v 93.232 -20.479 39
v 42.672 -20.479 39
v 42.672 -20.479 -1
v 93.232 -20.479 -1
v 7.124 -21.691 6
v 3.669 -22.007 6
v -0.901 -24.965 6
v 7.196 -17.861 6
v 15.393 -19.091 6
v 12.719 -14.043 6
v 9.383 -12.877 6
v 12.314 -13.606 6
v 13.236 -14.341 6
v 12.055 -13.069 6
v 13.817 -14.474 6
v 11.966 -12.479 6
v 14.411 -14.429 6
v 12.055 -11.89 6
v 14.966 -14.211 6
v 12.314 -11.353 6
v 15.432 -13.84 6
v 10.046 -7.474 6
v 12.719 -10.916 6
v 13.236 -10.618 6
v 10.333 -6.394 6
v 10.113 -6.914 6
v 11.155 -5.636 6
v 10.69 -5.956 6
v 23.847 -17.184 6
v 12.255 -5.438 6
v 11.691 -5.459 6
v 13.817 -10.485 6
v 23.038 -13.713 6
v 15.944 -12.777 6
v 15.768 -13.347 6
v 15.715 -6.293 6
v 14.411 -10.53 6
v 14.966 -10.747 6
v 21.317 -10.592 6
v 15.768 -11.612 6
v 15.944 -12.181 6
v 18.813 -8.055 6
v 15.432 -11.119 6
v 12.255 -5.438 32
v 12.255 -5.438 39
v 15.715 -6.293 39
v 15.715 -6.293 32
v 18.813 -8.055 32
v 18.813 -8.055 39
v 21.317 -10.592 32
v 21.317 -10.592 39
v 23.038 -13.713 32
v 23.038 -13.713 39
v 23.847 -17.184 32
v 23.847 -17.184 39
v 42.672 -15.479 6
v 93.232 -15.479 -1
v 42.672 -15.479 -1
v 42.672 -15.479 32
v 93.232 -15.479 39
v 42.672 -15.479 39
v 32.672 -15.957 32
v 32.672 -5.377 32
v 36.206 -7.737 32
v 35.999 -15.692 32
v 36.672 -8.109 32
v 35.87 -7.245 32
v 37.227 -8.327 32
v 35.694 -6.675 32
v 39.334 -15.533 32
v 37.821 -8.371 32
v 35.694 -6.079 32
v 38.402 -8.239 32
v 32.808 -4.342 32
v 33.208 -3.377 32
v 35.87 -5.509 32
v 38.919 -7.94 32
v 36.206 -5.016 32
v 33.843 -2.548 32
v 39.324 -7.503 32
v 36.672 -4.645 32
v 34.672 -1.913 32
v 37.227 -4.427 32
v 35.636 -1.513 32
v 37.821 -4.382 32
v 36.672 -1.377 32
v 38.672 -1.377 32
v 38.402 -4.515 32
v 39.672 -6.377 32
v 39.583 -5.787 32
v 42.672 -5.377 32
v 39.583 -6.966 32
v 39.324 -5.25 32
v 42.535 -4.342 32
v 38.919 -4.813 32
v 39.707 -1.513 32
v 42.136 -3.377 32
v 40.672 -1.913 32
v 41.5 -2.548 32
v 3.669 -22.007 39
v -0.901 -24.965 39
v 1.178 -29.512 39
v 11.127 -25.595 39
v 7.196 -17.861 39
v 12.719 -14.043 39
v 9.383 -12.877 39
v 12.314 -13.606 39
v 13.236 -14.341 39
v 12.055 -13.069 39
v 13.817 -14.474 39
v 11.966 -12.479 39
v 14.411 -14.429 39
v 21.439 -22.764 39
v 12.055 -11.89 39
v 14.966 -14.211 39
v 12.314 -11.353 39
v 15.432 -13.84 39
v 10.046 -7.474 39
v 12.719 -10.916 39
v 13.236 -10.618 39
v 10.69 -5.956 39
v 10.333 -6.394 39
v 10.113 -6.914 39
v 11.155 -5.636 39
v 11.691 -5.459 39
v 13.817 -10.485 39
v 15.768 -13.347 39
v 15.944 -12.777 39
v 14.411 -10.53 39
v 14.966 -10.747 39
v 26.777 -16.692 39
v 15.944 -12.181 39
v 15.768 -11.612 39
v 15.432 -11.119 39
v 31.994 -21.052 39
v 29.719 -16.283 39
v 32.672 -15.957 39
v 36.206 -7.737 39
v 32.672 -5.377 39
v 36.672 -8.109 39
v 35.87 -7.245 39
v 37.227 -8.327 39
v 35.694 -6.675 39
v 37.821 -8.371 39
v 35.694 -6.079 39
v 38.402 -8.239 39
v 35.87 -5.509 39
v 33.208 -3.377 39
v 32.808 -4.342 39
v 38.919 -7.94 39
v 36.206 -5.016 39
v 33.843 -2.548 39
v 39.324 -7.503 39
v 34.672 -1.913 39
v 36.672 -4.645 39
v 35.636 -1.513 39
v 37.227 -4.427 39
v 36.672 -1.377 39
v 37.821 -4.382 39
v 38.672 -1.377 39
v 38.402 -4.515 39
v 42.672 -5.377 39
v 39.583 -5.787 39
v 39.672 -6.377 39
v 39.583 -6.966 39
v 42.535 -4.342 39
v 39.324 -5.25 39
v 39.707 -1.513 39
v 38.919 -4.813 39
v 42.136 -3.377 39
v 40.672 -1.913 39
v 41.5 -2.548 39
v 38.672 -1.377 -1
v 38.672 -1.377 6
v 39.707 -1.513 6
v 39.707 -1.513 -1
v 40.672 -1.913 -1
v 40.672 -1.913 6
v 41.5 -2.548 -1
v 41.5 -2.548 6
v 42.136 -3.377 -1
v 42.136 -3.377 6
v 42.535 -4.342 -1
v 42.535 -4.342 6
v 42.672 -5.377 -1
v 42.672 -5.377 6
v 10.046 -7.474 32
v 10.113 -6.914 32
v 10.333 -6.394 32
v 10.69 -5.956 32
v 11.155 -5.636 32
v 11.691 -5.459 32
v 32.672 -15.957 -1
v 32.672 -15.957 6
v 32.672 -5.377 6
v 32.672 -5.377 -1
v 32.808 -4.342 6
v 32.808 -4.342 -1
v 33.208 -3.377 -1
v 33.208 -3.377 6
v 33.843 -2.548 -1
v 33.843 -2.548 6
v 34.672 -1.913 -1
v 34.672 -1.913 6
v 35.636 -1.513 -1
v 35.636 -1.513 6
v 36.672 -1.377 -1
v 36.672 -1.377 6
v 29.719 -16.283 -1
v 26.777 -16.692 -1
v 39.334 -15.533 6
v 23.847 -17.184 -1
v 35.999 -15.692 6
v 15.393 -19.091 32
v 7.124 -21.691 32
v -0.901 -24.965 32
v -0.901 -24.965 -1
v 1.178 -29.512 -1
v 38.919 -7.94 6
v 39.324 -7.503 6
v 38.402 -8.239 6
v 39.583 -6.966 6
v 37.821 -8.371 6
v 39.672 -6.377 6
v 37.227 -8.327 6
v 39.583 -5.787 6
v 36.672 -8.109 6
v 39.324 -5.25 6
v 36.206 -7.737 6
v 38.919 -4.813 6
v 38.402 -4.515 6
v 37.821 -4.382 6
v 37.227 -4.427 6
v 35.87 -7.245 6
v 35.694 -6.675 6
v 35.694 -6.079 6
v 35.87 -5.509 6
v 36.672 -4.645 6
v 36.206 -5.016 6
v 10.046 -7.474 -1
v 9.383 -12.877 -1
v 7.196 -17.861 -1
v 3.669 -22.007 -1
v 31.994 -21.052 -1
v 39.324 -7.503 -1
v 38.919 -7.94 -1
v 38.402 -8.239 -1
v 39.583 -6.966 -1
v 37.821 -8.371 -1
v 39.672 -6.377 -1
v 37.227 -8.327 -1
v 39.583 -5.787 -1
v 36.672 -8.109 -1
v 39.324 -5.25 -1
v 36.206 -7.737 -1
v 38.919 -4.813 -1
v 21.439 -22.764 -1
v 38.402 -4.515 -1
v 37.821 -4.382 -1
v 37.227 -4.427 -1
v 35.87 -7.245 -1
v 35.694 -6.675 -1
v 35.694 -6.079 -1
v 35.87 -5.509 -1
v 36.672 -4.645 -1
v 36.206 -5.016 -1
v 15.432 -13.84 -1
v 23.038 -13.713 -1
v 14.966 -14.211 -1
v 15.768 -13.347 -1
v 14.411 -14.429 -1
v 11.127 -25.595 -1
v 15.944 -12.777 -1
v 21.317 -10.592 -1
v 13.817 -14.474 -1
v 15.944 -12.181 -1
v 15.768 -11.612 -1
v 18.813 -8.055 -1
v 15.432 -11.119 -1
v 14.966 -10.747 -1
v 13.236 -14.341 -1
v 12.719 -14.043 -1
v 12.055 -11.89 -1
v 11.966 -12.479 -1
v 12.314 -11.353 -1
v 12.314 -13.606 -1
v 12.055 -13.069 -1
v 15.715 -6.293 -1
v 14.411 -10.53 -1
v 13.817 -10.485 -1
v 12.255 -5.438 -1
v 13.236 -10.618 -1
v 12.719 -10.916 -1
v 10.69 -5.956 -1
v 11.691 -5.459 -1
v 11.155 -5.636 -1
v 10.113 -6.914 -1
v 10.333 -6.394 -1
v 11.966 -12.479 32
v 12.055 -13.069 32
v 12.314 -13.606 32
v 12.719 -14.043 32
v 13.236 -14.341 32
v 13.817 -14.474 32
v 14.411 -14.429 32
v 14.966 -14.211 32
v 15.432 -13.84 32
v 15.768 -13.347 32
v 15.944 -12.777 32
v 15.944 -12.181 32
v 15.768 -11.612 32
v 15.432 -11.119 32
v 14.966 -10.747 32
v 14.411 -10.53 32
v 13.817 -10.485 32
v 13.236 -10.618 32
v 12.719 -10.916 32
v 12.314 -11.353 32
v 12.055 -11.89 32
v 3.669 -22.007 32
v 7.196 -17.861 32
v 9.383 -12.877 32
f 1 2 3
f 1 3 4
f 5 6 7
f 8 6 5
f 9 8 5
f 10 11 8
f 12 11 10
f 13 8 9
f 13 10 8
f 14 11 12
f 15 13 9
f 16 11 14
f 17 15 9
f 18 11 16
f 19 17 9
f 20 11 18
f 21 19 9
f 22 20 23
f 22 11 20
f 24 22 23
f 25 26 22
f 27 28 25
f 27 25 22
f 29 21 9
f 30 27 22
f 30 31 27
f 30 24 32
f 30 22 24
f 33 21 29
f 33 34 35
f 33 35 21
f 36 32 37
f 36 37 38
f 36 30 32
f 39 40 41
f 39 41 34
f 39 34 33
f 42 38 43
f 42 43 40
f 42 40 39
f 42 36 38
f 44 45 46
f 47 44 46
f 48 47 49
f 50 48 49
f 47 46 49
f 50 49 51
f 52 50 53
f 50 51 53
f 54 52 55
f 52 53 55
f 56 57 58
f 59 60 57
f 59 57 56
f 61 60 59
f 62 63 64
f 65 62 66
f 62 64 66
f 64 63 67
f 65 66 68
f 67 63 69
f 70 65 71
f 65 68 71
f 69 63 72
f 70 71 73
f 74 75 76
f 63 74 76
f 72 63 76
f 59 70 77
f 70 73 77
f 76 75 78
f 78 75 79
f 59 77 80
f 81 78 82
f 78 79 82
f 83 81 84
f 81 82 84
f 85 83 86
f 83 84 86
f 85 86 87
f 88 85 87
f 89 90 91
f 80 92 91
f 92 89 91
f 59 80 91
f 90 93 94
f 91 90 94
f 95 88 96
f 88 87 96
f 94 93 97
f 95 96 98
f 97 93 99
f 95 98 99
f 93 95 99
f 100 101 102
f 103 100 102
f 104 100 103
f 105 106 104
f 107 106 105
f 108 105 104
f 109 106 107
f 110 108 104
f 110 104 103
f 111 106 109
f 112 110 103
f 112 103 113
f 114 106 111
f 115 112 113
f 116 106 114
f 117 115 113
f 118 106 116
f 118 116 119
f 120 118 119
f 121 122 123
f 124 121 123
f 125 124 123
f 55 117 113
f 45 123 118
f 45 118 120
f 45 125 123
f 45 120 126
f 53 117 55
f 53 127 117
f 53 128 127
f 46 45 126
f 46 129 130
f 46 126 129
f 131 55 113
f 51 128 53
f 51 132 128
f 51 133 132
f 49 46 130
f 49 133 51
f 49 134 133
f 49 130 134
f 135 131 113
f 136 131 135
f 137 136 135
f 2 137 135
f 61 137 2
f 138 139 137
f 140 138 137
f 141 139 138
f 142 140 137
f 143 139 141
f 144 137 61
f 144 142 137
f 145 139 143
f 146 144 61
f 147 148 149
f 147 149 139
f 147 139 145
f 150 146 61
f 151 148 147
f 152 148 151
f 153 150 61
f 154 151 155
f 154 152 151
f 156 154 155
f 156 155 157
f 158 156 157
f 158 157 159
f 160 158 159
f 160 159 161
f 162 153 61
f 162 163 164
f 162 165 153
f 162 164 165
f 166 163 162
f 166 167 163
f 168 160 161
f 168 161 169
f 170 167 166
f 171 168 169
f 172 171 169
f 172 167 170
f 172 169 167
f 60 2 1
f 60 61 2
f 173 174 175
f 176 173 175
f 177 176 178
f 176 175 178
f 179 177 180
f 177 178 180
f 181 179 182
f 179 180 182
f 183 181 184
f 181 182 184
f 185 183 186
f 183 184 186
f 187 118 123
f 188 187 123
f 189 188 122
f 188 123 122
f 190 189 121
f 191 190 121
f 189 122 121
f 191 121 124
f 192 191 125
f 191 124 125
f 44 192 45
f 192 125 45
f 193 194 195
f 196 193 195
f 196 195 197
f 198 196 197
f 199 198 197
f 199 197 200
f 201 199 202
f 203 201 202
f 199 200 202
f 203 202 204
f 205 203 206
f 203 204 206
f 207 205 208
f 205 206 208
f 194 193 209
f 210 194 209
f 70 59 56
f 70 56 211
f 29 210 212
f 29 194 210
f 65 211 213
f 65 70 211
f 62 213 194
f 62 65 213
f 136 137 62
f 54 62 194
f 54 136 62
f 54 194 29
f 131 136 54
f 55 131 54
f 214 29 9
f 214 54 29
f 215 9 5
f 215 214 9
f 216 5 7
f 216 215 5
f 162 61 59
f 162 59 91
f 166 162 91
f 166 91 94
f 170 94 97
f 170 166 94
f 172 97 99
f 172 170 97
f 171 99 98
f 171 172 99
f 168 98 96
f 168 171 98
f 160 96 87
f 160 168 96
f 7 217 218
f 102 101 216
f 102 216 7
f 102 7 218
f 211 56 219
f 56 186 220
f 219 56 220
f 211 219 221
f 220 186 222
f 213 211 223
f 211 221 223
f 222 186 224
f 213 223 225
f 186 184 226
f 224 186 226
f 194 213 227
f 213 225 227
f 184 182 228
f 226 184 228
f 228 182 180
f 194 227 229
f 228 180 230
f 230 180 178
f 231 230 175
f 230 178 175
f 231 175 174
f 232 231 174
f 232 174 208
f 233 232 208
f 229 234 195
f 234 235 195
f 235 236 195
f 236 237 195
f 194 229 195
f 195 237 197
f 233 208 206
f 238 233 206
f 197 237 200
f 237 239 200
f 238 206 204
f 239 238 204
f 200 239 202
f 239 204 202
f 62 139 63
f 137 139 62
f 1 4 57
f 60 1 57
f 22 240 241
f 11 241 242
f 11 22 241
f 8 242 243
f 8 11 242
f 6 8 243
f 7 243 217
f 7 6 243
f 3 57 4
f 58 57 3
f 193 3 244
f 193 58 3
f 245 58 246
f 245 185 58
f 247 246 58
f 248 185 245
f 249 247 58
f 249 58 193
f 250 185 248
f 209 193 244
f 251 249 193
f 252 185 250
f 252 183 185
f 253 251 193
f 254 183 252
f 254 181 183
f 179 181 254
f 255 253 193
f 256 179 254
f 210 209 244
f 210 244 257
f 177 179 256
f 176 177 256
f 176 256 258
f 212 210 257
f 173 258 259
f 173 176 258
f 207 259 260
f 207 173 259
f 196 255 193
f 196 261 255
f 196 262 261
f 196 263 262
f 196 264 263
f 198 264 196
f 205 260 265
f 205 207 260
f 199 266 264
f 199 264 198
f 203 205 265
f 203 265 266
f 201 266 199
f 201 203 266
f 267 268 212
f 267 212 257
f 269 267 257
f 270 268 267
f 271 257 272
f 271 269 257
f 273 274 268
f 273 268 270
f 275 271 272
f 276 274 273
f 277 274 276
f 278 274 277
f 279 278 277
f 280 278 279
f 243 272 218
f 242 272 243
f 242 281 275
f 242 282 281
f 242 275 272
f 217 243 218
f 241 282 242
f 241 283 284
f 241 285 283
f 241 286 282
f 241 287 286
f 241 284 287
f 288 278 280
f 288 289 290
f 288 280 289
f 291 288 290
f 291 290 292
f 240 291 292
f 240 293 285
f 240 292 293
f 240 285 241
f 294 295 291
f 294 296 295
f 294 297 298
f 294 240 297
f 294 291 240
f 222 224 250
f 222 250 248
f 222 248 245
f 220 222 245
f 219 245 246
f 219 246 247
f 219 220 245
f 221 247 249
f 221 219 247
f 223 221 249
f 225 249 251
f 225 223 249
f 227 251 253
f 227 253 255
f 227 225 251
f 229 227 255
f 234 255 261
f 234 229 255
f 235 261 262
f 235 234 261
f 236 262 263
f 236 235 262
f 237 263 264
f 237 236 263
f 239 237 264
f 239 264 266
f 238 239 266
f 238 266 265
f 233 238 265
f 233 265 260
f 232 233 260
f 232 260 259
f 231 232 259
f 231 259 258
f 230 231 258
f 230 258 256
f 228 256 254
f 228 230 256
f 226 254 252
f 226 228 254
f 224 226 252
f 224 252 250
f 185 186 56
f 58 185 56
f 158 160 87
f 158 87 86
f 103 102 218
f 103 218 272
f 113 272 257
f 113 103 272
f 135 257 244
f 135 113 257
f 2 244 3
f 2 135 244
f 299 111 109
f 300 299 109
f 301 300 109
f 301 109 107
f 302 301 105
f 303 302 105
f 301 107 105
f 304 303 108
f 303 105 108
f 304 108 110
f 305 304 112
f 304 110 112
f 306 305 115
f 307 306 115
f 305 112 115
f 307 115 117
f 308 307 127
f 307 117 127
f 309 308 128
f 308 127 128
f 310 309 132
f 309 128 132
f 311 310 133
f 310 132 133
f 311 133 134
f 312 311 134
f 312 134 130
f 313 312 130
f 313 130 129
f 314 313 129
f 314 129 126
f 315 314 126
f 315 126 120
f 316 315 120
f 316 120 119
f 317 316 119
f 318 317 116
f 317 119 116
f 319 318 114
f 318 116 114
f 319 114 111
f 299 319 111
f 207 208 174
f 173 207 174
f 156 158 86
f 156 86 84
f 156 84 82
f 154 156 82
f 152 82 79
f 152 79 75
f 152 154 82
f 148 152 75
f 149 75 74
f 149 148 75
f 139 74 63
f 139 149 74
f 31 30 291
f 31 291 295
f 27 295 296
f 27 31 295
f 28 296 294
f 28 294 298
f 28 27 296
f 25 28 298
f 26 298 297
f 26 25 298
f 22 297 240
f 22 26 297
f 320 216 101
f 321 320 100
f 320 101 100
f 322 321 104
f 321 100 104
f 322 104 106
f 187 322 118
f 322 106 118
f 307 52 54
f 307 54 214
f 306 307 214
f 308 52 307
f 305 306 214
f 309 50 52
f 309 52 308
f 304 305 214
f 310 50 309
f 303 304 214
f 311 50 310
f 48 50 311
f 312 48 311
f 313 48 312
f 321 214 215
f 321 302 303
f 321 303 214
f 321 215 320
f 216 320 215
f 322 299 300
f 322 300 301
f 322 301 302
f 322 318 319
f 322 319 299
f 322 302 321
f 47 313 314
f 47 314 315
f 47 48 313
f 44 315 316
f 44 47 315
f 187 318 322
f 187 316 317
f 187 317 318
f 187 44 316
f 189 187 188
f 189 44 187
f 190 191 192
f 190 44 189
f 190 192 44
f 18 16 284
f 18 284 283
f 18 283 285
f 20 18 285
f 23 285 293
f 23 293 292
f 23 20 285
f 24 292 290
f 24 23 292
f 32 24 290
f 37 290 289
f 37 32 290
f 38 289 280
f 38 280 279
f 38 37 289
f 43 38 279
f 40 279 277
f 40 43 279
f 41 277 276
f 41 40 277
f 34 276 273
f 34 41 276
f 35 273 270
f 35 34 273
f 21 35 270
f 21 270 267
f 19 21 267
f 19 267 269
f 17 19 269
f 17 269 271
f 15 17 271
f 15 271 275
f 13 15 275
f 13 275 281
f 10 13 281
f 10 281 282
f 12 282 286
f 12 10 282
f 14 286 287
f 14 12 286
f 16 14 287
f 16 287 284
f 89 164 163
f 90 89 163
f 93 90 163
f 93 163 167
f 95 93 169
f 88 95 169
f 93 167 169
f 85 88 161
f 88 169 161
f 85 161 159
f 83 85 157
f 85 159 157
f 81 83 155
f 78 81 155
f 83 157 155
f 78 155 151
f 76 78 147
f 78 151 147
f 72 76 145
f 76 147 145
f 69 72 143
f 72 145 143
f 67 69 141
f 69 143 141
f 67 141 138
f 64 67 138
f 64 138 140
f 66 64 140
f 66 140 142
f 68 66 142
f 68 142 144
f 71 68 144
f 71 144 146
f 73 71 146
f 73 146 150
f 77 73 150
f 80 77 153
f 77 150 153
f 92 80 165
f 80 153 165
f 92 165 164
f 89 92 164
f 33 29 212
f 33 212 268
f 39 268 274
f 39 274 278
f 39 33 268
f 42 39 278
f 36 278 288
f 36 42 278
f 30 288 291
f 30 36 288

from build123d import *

# Parameters (mm, degrees)
BOSS_EXTRUDE1_DEPTH     = 38
BOSS_EXTRUDE2_START     = 1
BOSS_EXTRUDE2_DEPTH     = 1
SKETCH5_R               = 1.5
BOSS_EXTRUDE4_DEPTH     = 2
CUT_EXTRUDE1_REACH      = 109.923
CUT_EXTRUDE1_END_RADIUS = 5
SKETCH6_W               = 4
SKETCH6_H               = 25
SKETCH7_W               = 12
SKETCH7_H               = 7
CUT_EXTRUDE2_DEPTH      = 4.870537
SKETCH8_W               = 14
SKETCH8_H               = 8
SKETCH8_W_2             = 7
SKETCH8_H_2             = 2
BOSS_EXTRUDE5_DEPTH     = 1
CUT_EXTRUDE3_REACH      = 112.064
BOSS_EXTRUDE6_REACH     = 114.27
FILLET1_R               = 2
FILLET2_R               = 1.5
CUT_EXTRUDE4_START      = -1
CUT_EXTRUDE4_DEPTH      = 1
CUT_EXTRUDE5_DEPTH      = 114.605044241
CUT_EXTRUDE5_DEPTH_BACK = 114.605044241
CUT_EXTRUDE6_DEPTH      = 1
BOSS_EXTRUDE7_DEPTH     = 40
CUT_EXTRUDE7_DEPTH      = 114.952209619
BOSS_EXTRUDE8_START     = -7
SKETCH16_R              = 2
BOSS_EXTRUDE8_DEPTH     = 7
SKETCH17_R              = 2
BOSS_EXTRUDE9_DEPTH     = 7
SKETCH18_R              = 2
BOSS_EXTRUDE10_DEPTH    = 7
BOSS_EXTRUDE11_START    = -7
SKETCH19_R              = 2
BOSS_EXTRUDE11_DEPTH    = 7


with BuildPart() as part:
    # Sketch1 → Boss-Extrude1 (new body)
    with BuildSketch(Plane.XY):
        with BuildLine():
            ThreePointArc((94.07424068, -40.969403892), (98.52214239, -30.71978446), (94.053011164, -20.479403892))
            Line((94.053011164, -20.479403892), (42.671612541, -20.479403892))
            ThreePointArc((42.671612541, -20.479403892), (21.438645912, -22.763779795), (1.177500664, -29.512352859))
            ThreePointArc((1.177500664, -29.512352859), (-2.191079084, -36.245666757), (3.671612541, -40.969403889))
            Line((3.671612541, -40.969403889), (3.671612541, -39.969403889))
            ThreePointArc((3.671612541, -39.969403889), (-1.213963813, -36.032956279), (1.593185977, -30.421861364))
            ThreePointArc((1.593185977, -30.421861364), (21.65135639, -23.740895066), (42.671612541, -21.479403892))
            Line((42.671612541, -21.479403892), (93.651612541, -21.479403892))
            ThreePointArc((93.651612541, -21.479403892), (97.522142299, -30.720228087), (93.671612541, -39.969403889))
            Line((93.671612541, -39.969403889), (93.671612541, -40.969403892))
            Line((93.671612541, -40.969403892), (94.07424068, -40.969403892))
        make_face()
    extrude(amount=BOSS_EXTRUDE1_DEPTH)

    # Sketch2 → Boss-Extrude2 (add)
    with BuildSketch(Plane(origin=(0, 0, 0), x_dir=(-1, 0, 0), z_dir=(0, 0, -1)).offset(BOSS_EXTRUDE2_START)):
        with BuildLine():
            Line((-93.671612541, -40.969403892), (-3.671612541, -40.969403889))
            ThreePointArc((-3.671612541, -40.969403889), (2.191079084, -36.245666757), (-1.177500664, -29.512352859))
            ThreePointArc((-1.177500664, -29.512352859), (-21.438645912, -22.763779795), (-42.671612541, -20.479403892))
            Line((-42.671612541, -20.479403892), (-94.053011164, -20.479403892))
            ThreePointArc((-94.053011164, -20.479403892), (-98.52214239, -30.71978446), (-94.07424068, -40.969403892))
            Line((-94.07424068, -40.969403892), (-93.671612541, -40.969403892))
        make_face()
    boss_extrude2 = extrude(amount=-BOSS_EXTRUDE2_DEPTH)

    # Mirror1: Boss-Extrude2 across plane
    add(boss_extrude2.mirror(Plane.XY.offset(19)))

    # Sketch5 → Boss-Extrude4 (add)
    with BuildSketch(Plane.XZ.offset(21.479403892)):
        with Locations(Location((45.301612541, 27.89, 0), (0, 0, 270))):
            Circle(SKETCH5_R)
        with Locations(Location((45.301612541, 10.11, 0), (0, 0, 270))):
            Circle(SKETCH5_R)
        with Locations(Location((91.021612541, 27.89, 0), (0, 0, 270))):
            Circle(SKETCH5_R)
        with Locations(Location((91.021612541, 10.11, 0), (0, 0, 270))):
            Circle(SKETCH5_R)
    extrude(amount=BOSS_EXTRUDE4_DEPTH)

    # Cut-Extrude1: up to this cylinder (the profile starts outside it)
    cut_extrude1_end = Plane(origin=(3.671612541, -34.969403889, 19), z_dir=(0, 0, -1)) * Cylinder(CUT_EXTRUDE1_END_RADIUS, 230.846, mode=Mode.PRIVATE)
    # Sketch6 → Cut-Extrude1 (cut, up to the surface)
    with BuildSketch(Plane(origin=(0.000112733, -40.969403891, 0), x_dir=(1, 0, 0), z_dir=(0, -1, 0)), mode=Mode.PRIVATE) as cut_extrude1_sk1:
        with Locations((1.671499809, 19)):
            Rectangle(SKETCH6_W, SKETCH6_H)
    cut_extrude1_tool1 = extrude(cut_extrude1_sk1.sketch, amount=-CUT_EXTRUDE1_REACH, mode=Mode.PRIVATE) - cut_extrude1_end
    add(cut_extrude1_tool1.solids().sort_by_distance((1.671613, -40.969404, 19))[0], mode=Mode.SUBTRACT)

    # Sketch7 → Cut-Extrude2 (cut)
    with BuildSketch(Plane(origin=(98.522149904, 0, 0), x_dir=(0, 0, -1), z_dir=(1, 0, 0))):
        with Locations((-19, -23.979403892)):
            Rectangle(SKETCH7_W, SKETCH7_H)
    extrude(amount=-CUT_EXTRUDE2_DEPTH, mode=Mode.SUBTRACT)

    # Sketch8 → Boss-Extrude5 (add)
    with BuildSketch(Plane(origin=(93.651612541, 0, 0), x_dir=(0, 0, -1), z_dir=(1, 0, 0))):
        with Locations((-19, -24.479403892)):
            Rectangle(SKETCH8_W, SKETCH8_H)
        with Locations((-19, -24.179403892)):
            Rectangle(SKETCH8_W_2, SKETCH8_H_2, mode=Mode.SUBTRACT)
    extrude(amount=BOSS_EXTRUDE5_DEPTH)

    # Sketch9 → Cut-Extrude3 (cut, up to next)
    with BuildSketch(Plane.XY.offset(26), mode=Mode.PRIVATE) as cut_extrude3_sk1:
        with BuildLine():
            Line((94.651612541, -21.070233304), (94.651612541, -20.479403892))
            Line((94.651612541, -20.479403892), (94.053011164, -20.479403892))
            ThreePointArc((94.053011164, -20.479403892), (94.356749733, -20.770322341), (94.651612541, -21.070233304))
        make_face()
    cut_extrude3_tool1 = extrude(cut_extrude3_sk1.sketch, amount=-CUT_EXTRUDE3_REACH, mode=Mode.PRIVATE) & part.part
    add(cut_extrude3_tool1.solids().sort_by_distance((94.454082, -20.674371, 26))[0], mode=Mode.SUBTRACT)

    # Sketch10 → Boss-Extrude6 (add, up to next)
    with BuildSketch(Plane(origin=(94.651612541, 0, 0), x_dir=(0, 0, -1), z_dir=(1, 0, 0)), mode=Mode.PRIVATE) as boss_extrude6_sk1:
        Polygon((-26, -22.586039205), (-26, -28.479403892), (-12, -28.479403892), (-12, -22.586039205), (-13, -22.586039205), (-13, -27.479403892), (-25, -27.479403892), (-25, -22.586039205), align=None)
    boss_extrude6_tool1 = extrude(boss_extrude6_sk1.sketch, amount=BOSS_EXTRUDE6_REACH, mode=Mode.PRIVATE) - part.part
    add(boss_extrude6_tool1.solids().sort_by_distance((94.651613, -25.532722, 25.848101))[0])

    # Fillet1
    # the kernel refuses this fillet: 2 mm, written as the material it takes off along each edge
    with BuildSketch(Plane(origin=(94.053011164, -20.479403892, -3.217701096), x_dir=(-1, 0, 0), z_dir=(0, 0, 1))) as fillet1_piece_1:
        with BuildLine():
            CenterArc((0.8212769, 2), FILLET1_R, 223.46466941, 46.53533059)
            ThreePointArc((-0.630320494, 0.624185693), (-0.320105264, 0.307099227), (0, 0))
            Line((0, 0), (0.8212769, 0))
        make_face()
    extrude(amount=44.435402191, mode=Mode.SUBTRACT)

    # Fillet2
    # the kernel refuses this fillet: 1.5 mm, written as the material it takes off along each edge
    with BuildSketch(Plane(origin=(93.651612541, -28.479403892, 8.25), x_dir=(1, 0, 0), z_dir=(0, 0, 1))) as fillet2_piece_1:
        with BuildLine():
            CenterArc((FILLET2_R, FILLET2_R), FILLET2_R, 180, 90)
            Line((0, FILLET2_R), (0, 0))
            Line((0, 0), (FILLET2_R, 0))
        make_face()
    extrude(amount=21.5, mode=Mode.SUBTRACT)
    with BuildSketch(Plane(origin=(94.651612541, -21.070877825, 25), x_dir=(-0.9302888810599873, 0.3668277494630918, 0), z_dir=(0, 0, -1))) as fillet2_piece_2:
        with BuildLine():
            CenterArc((1.062160749, -1.395433322), FILLET2_R, 68.479891106, 90)
            Line((-0.333272572, -0.845191697), (-0.472815904, -0.790167535))
            Line((-0.472815904, -0.790167535), (-0.139543332, 0.055024162))
            Line((-0.139543332, 0.055024162), (-0.060315789, 0.137339017))
            ThreePointArc((-0.060315789, 0.137339017), (1.592890188, 0.168934204), (1.667426536, 0.139543332))
            Line((1.667426536, 0.139543332), (1.612402374, 0))
        make_face()
    extrude(amount=12, mode=Mode.SUBTRACT)

    # Sketch11 → Cut-Extrude4 (cut)
    with BuildSketch(Plane.XY.offset(39).offset(CUT_EXTRUDE4_START)):
        with BuildLine():
            Line((94.07424068, -40.969403892), (94.07424068, -27.479403892))
            Line((94.07424068, -27.479403892), (42.671612541, -27.479403892))
            ThreePointArc((42.671612541, -27.479403892), (20.062639565, -30.27500623), (-1.184449421, -38.493416121))
            ThreePointArc((-1.184449421, -38.493416121), (0.946183529, -40.314685612), (3.671612541, -40.969403889))
            Line((3.671612541, -40.969403889), (94.07424068, -40.969403892))
        make_face()
    extrude(amount=CUT_EXTRUDE4_DEPTH, mode=Mode.SUBTRACT)

    # Sketch12 → Cut-Extrude5 (cut, two sides: drawn at the far end of the back side and taken through both)
    with BuildSketch(Plane.XY.offset(38).offset(-CUT_EXTRUDE5_DEPTH_BACK)):
        with BuildLine():
            Line((0.671612541, -40.165556311), (0.671612541, -38.969403889))
            ThreePointArc((0.671612541, -38.969403889), (2.090473711, -39.712820379), (3.671612541, -39.969403889))
            Line((3.671612541, -39.969403889), (3.671612541, -40.969403889))
            ThreePointArc((3.671612541, -40.969403889), (2.118698271, -40.764958846), (0.671612541, -40.165556311))
        make_face()
    extrude(amount=CUT_EXTRUDE5_DEPTH + CUT_EXTRUDE5_DEPTH_BACK, mode=Mode.SUBTRACT)

    # Sketch13 → Cut-Extrude6 (cut)
    with BuildSketch(Plane(origin=(0, 0, -1), x_dir=(-1, 0, 0), z_dir=(0, 0, -1))):
        with BuildLine():
            Line((-94.07424068, -27.479403892), (-94.07424068, -40.969403892))
            Line((-94.07424068, -40.969403892), (-3.671612541, -40.969403889))
            Line((-3.671612541, -40.969403889), (-3.671612541, -39.969403889))
            ThreePointArc((-3.671612541, -39.969403889), (-2.090473711, -39.712820379), (-0.671612541, -38.969403889))
            Line((-0.671612541, -38.969403889), (-0.671612541, -40.165556311))
            ThreePointArc((-0.671612541, -40.165556311), (0.344410441, -39.427156619), (1.184449421, -38.493416121))
            ThreePointArc((1.184449421, -38.493416121), (-20.062639565, -30.27500623), (-42.671612541, -27.479403892))
            Line((-42.671612541, -27.479403892), (-94.07424068, -27.479403892))
        make_face()
    extrude(amount=-CUT_EXTRUDE6_DEPTH, mode=Mode.SUBTRACT)

    # Sketch14 → Boss-Extrude7 (add, through all)
    with BuildSketch(Plane.XY.offset(39)):
        with BuildLine():
            Line((42.671612541, -20.479403892), (93.231734264, -20.479403892))
            Line((93.231734264, -20.479403892), (93.231734264, -15.479403892))
            Line((93.231734264, -15.479403892), (42.671612541, -15.479403892))
            ThreePointArc((42.671612541, -15.479403892), (20.375093521, -17.878203441), (-0.9009259, -24.964810334))
            Line((-0.9009259, -24.964810334), (1.177500664, -29.512352859))
            ThreePointArc((1.177500664, -29.512352859), (21.438645912, -22.763779795), (42.671612541, -20.479403892))
        make_face()
    extrude(amount=-BOSS_EXTRUDE7_DEPTH)

    # Sketch15 → Cut-Extrude7 (cut, through all)
    with BuildSketch(Plane.XY.offset(39)):
        with BuildLine():
            Line((93.231734264, -20.479403892), (113.754694227, -15.939324801))
            Line((113.754694227, -15.939324801), (103.493214246, -63.655688178))
            Line((103.493214246, -63.655688178), (-19.85580102, -63.655688178))
            Line((-19.85580102, -63.655688178), (-16.285239541, -25.988091954))
            Line((-16.285239541, -25.988091954), (1.177500664, -29.512352859))
            ThreePointArc((1.177500664, -29.512352859), (21.438645912, -22.763779795), (42.671612541, -20.479403892))
            Line((42.671612541, -20.479403892), (93.231734264, -20.479403892))
        make_face()
    extrude(amount=-CUT_EXTRUDE7_DEPTH, mode=Mode.SUBTRACT)

    # Sketch16 → Boss-Extrude8 (add)
    with BuildSketch(Plane(origin=(0, 0, -1), x_dir=(-1, 0, 0), z_dir=(0, 0, -1)).offset(BOSS_EXTRUDE8_START)):
        with BuildLine():
            ThreePointArc((0.9009259, -24.964810334), (-11.231615785, -20.305562163), (-23.847476831, -17.18350974))
            ThreePointArc((-23.847476831, -17.18350974), (-20.15199056, -9.237296242), (-12.254952675, -5.437859392))
            ThreePointArc((-12.254952675, -5.437859392), (-10.689930256, -5.956372475), (-10.046089467, -7.474140583))
            ThreePointArc((-10.046089467, -7.474140583), (-7.195975116, -17.861398125), (0.9009259, -24.964810334))
        make_face()
        with Locations((-13.96627469, -12.479403892)):
            Circle(SKETCH16_R, mode=Mode.SUBTRACT)
    extrude(amount=BOSS_EXTRUDE8_DEPTH)

    # Sketch17 → Boss-Extrude9 (add)
    with BuildSketch(Plane.XY.offset(39)):
        with BuildLine():
            ThreePointArc((-0.9009259, -24.964810334), (7.195975116, -17.861398125), (10.046089467, -7.474140583))
            ThreePointArc((10.046089467, -7.474140583), (10.689930256, -5.956372475), (12.254952675, -5.437859392))
            ThreePointArc((12.254952675, -5.437859392), (20.15199056, -9.237296242), (23.847476831, -17.18350974))
            ThreePointArc((23.847476831, -17.18350974), (11.231615785, -20.305562163), (-0.9009259, -24.964810334))
        make_face()
        with Locations(Location((13.96627469, -12.479403892, 0), (0, 0, 180))):
            Circle(SKETCH17_R, mode=Mode.SUBTRACT)
    extrude(amount=-BOSS_EXTRUDE9_DEPTH)

    # Sketch18 → Boss-Extrude10 (add)
    with BuildSketch(Plane.XY.offset(39)):
        with BuildLine():
            Line((42.671612541, -15.479403892), (42.671612541, -5.376783048))
            ThreePointArc((42.671612541, -5.376783048), (41.500039666, -2.548355923), (38.671612541, -1.376783048))
            Line((38.671612541, -1.376783048), (36.671612541, -1.376783048))
            ThreePointArc((36.671612541, -1.376783048), (33.843185417, -2.548355923), (32.671612541, -5.376783048))
            Line((32.671612541, -5.376783048), (32.671612541, -15.95749798))
            ThreePointArc((32.671612541, -15.95749798), (37.665901454, -15.598995636), (42.671612541, -15.479403892))
        make_face()
        with Locations((37.671612541, -6.376783048)):
            Circle(SKETCH18_R, mode=Mode.SUBTRACT)
    extrude(amount=-BOSS_EXTRUDE10_DEPTH)

    # Sketch19 → Boss-Extrude11 (add)
    with BuildSketch(Plane(origin=(0, 0, -1), x_dir=(-1, 0, 0), z_dir=(0, 0, -1)).offset(BOSS_EXTRUDE11_START)):
        with BuildLine():
            Line((-32.671612541, -15.95749798), (-32.671612541, -5.376783048))
            ThreePointArc((-32.671612541, -5.376783048), (-33.843185417, -2.548355923), (-36.671612541, -1.376783048))
            Line((-36.671612541, -1.376783048), (-38.671612541, -1.376783048))
            ThreePointArc((-38.671612541, -1.376783048), (-41.500039666, -2.548355923), (-42.671612541, -5.376783048))
            Line((-42.671612541, -5.376783048), (-42.671612541, -15.479403892))
            ThreePointArc((-42.671612541, -15.479403892), (-37.665901454, -15.598995636), (-32.671612541, -15.95749798))
        make_face()
        with Locations(Location((-37.671612541, -6.376783048, 0), (0, 0, 180))):
            Circle(SKETCH19_R, mode=Mode.SUBTRACT)
    extrude(amount=BOSS_EXTRUDE11_DEPTH)


solid = part.part
